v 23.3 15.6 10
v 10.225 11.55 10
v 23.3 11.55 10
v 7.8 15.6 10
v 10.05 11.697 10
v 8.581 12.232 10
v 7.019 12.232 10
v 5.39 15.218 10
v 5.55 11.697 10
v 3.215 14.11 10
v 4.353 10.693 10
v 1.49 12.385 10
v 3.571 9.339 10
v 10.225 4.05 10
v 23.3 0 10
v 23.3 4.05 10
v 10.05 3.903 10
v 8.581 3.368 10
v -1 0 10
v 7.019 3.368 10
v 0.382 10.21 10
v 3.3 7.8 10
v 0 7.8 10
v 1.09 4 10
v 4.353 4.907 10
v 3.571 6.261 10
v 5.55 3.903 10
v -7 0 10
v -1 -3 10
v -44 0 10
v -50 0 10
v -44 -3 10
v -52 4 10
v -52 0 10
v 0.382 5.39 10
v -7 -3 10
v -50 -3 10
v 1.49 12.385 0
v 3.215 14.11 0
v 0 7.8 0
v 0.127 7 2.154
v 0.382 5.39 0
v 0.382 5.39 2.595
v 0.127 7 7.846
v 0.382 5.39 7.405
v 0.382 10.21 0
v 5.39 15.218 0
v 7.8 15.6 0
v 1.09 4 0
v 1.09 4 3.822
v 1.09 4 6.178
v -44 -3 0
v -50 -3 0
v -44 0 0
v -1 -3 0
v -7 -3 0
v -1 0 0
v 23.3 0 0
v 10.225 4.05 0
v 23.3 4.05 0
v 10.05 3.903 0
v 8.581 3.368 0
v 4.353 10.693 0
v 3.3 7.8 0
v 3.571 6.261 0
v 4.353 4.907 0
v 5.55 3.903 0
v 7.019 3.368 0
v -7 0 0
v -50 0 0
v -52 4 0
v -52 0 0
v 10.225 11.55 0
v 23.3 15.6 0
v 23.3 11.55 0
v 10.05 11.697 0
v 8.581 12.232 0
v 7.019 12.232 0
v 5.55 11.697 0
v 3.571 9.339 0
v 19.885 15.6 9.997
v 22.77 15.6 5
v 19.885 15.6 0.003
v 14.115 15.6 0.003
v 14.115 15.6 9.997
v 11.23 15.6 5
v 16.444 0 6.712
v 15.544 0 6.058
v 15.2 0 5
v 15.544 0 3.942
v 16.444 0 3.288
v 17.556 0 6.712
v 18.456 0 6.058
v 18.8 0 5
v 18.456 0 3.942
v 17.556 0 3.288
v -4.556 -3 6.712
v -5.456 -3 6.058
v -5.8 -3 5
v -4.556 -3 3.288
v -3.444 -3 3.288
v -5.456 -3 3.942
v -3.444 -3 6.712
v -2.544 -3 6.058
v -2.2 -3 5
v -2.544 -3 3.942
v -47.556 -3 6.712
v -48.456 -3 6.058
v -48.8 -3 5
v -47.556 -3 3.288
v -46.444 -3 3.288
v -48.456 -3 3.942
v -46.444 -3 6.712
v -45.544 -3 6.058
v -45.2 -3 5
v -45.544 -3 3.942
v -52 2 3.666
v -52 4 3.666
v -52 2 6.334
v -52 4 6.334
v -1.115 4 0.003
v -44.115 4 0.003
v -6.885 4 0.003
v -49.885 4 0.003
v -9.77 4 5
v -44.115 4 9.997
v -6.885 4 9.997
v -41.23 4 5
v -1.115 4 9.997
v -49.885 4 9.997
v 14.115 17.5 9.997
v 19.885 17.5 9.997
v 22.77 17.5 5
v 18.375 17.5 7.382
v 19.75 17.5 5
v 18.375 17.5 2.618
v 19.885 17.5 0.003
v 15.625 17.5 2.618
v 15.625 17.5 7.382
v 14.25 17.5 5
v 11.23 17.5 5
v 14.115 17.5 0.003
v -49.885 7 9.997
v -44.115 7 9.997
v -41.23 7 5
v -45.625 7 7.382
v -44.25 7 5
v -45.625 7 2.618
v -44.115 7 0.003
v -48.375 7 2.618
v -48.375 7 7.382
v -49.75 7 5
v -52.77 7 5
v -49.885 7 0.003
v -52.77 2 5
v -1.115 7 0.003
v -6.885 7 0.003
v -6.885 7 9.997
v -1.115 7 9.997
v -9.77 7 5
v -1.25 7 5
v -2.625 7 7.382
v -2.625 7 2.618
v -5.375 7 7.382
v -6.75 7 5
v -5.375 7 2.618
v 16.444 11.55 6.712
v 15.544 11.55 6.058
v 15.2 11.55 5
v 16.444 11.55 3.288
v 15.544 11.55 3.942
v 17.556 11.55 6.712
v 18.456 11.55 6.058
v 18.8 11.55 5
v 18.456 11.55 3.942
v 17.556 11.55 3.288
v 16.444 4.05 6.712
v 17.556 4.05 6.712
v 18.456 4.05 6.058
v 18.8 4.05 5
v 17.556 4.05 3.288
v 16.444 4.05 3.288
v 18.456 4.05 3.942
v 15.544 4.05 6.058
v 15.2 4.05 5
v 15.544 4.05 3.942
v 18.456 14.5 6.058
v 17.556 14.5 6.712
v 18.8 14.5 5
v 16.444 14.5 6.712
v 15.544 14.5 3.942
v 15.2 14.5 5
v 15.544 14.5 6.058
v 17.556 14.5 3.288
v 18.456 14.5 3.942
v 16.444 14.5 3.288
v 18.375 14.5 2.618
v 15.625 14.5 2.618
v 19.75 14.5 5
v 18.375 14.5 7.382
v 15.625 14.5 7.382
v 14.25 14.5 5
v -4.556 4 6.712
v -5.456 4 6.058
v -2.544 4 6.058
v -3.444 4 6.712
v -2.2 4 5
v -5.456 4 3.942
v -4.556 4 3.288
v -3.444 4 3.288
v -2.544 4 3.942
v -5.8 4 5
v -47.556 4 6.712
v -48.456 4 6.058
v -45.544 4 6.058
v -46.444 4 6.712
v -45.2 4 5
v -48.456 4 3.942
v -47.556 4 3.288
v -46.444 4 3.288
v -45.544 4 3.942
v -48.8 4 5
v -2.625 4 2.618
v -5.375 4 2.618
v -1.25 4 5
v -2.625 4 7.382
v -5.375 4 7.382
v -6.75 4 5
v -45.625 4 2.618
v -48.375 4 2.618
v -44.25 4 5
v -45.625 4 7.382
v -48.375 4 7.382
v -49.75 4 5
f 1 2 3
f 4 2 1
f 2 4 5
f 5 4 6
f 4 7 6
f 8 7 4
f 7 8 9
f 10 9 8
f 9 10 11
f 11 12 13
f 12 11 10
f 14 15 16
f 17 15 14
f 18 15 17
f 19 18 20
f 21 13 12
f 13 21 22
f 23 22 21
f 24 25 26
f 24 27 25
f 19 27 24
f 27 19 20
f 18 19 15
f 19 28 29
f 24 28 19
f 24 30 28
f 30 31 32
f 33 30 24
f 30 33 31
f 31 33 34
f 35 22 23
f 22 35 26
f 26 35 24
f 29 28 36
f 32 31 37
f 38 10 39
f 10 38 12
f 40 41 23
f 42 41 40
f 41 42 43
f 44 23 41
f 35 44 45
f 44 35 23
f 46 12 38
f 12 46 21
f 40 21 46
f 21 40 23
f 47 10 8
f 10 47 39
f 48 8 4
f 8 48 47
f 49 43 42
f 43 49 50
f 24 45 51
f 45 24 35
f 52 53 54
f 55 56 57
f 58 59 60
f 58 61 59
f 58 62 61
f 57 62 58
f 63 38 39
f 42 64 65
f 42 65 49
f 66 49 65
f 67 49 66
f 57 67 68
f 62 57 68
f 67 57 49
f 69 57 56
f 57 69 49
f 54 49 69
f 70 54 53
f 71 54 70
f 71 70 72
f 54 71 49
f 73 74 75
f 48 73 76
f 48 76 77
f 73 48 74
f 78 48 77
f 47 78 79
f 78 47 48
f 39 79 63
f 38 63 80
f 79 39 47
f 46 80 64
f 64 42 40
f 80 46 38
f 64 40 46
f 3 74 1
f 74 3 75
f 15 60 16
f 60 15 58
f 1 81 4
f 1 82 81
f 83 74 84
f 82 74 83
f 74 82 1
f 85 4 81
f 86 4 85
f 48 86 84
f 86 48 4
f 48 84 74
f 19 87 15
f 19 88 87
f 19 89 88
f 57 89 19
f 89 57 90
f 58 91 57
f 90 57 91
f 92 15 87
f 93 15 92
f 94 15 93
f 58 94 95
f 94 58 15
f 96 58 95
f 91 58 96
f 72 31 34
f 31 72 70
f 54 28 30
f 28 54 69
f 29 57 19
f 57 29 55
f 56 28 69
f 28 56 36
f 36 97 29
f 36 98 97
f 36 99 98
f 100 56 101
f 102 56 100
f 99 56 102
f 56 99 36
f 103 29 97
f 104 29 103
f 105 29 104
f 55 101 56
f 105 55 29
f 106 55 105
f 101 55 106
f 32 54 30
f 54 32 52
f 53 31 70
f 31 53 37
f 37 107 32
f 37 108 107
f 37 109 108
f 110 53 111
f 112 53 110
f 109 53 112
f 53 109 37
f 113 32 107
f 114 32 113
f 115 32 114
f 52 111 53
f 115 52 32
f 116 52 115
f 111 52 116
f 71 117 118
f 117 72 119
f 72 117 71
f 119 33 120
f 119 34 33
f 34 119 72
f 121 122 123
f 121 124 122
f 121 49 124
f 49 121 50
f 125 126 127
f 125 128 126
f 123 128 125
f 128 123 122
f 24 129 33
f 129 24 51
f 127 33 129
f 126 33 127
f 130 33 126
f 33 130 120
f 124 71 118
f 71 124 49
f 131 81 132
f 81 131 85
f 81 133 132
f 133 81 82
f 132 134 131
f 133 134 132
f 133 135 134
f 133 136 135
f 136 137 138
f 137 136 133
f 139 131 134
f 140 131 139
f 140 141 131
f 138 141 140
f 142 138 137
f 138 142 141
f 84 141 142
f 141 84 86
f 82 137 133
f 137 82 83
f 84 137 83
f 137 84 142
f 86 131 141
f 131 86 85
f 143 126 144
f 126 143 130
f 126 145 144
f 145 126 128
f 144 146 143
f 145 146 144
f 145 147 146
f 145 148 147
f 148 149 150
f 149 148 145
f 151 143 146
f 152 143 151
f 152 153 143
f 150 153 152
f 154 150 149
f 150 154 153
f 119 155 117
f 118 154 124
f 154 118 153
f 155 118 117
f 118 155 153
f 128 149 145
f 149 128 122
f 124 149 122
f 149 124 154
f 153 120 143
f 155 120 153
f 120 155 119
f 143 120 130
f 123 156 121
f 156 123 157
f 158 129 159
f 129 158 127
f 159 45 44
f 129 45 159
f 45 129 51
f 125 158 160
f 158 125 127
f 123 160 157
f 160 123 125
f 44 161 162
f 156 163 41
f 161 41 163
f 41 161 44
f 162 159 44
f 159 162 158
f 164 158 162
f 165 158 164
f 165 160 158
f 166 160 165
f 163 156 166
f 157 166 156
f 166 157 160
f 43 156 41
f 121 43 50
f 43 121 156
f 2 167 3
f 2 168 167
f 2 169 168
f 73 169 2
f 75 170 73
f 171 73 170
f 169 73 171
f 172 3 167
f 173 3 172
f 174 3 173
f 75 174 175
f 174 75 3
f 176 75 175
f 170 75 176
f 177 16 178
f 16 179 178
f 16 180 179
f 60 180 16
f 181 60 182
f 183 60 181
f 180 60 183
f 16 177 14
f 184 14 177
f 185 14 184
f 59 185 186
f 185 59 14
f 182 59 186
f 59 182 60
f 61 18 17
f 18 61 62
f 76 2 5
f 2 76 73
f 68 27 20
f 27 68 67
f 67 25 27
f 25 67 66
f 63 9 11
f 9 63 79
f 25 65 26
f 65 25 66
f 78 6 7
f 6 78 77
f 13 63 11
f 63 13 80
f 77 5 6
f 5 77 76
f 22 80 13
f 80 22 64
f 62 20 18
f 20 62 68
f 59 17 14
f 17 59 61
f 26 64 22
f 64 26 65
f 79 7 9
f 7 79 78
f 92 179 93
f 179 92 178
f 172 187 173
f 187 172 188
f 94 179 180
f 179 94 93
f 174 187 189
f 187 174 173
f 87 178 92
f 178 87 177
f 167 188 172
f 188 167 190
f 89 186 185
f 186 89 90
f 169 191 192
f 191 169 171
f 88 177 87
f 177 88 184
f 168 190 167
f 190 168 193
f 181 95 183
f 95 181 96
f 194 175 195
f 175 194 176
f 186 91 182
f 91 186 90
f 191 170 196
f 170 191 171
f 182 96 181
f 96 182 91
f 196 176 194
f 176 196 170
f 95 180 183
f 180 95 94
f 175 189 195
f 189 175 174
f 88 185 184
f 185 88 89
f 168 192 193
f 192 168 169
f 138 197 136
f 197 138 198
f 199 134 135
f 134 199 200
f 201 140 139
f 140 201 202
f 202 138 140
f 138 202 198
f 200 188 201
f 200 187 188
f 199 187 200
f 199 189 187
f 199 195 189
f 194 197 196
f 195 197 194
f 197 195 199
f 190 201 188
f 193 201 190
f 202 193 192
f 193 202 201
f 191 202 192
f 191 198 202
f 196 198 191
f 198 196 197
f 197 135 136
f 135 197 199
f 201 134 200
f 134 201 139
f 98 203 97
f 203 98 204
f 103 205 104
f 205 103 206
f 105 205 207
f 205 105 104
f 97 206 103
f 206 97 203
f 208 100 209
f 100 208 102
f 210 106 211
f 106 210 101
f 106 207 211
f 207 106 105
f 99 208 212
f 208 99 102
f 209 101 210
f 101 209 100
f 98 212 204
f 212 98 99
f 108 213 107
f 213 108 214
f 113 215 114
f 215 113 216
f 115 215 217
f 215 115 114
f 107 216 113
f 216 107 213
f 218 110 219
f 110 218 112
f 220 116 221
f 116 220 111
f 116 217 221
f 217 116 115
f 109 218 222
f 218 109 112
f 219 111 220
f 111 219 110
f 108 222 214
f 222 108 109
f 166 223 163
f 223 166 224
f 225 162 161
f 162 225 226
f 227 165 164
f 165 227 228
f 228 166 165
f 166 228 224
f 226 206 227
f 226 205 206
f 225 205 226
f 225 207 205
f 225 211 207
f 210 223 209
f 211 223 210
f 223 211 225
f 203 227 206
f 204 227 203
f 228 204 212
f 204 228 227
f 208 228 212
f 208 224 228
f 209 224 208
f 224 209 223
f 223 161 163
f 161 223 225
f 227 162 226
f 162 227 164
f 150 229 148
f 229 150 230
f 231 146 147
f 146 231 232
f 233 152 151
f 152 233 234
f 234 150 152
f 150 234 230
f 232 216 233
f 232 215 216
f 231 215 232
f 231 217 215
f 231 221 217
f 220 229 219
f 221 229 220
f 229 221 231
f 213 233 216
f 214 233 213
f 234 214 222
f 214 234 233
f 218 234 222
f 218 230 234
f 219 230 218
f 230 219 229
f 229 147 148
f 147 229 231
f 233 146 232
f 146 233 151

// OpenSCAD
// file: functions.scad
// PRUSA Mendel  
// Functions used in many files
// GNU GPL v3
// Josef Průša
// josefprusa@me.com
// prusadjs.cz
// http://www.reprap.org/wiki/Prusa_Mendel
// http://github.com/prusajr/PrusaMendel


module nut(d,h,horizontal=true){
cornerdiameter =  (d / 2) / cos (180 / 6);
cylinder(h = h, r = cornerdiameter, $fn = 6);
if(horizontal){
for(i = [1:6]){
	rotate([0,0,60*i]) translate([-cornerdiameter-0.2,0,0]) rotate([0,0,-45]) cube(size = [2,2,h]);
}}
}

// Based on nophead research
module polyhole(d,h) {
    n = max(round(2 * d),3);
    rotate([0,0,180])
        cylinder(h = h, r = (d / 2) / cos (180 / n), $fn = n);
}




module roundcorner(diameter){
	difference(){
		cube(size = [diameter,diameter,99], center = false);
		translate(v = [diameter, diameter, 0]) cylinder(h = 100, r=diameter, center=true);
	}
}
// file: metric.scad
// PRUSA Mendel  
// Default metric sizes
// GNU GPL v3
// Josef Průša
// josefprusa@me.com
// prusadjs.cz
// http://www.reprap.org/wiki/Prusa_Mendel
// http://github.com/prusajr/PrusaMendel

// DONT CHANGE THIS FILE! ALTER VALUES IN CONFIGURATION.SCAD INSTEAD

// RODS

threaded_rod_diameter = 8.7;
threaded_rod_diameter_horizontal = 8.7;
smooth_bar_diameter = 8;
smooth_bar_diameter_horizontal = 8.5;

// Nuts and bolts

m8_diameter = 9;
m8_nut_diameter = 14.1;

m4_diameter = 4.5;
m4_nut_diameter = 9;

m3_diameter = 3.6;
m3_nut_diameter = 5.5;
m3_nut_diameter_horizontal = 6.1;

// Bushing holder

bushing_core_diameter = smooth_bar_diameter;
bushing_material_thickness = 1;

// Motors

motor_shaft = 5.5;
// file: configuration.scad
// PRUSA Mendel  
// Configuration file
// GNU GPL v3
// Josef Průša
// josefprusa@me.com
// prusadjs.cz
// http://www.reprap.org/wiki/Prusa_Mendel
// http://github.com/prusajr/PrusaMendel

// PLEASE SELECT ONE OF THE CONFIGURATIONS BELOW
// BY UN-COMMENTING IT

// Uncomment for metric settings
// METRIC METRIC METRIC METRIC METRIC METRIC METRIC METRIC 

include <metric.scad>;

// CUSTOM CUSTOM CUSTOM CUSTOM CUSTOM CUSTOM CUSTOM CUSTOM CUSTOM

thin_wall = 3;


// Linear bearing version
linear = false;
// set false for LM-8UU, true for LM-E-8UU (ignore if linear is set to false)
lme8uu = false;



// CHANGE ONLY THE STUFF YOU KNOW
// IT WILL REPLACE DEFAULT SETTING

// RODS

// threaded_rod_diameter = 0;
// threaded_rod_diameter_horizontal = 0;
// smooth_bar_diameter = 0;
// smooth_bar_diameter_horizontal = 0;

// Nuts and bolts

// m8_diameter = 0;
// m8_nut_diameter = 0;

// m4_diameter = 0;
// m4_nut_diameter = 0;

// m3_diameter = 0;
// m3_nut_diameter = 0;

// Bushing holder

// bushing_core_diameter = smooth_bar_diameter;
// bushing_material_thickness = 0;


///counted stuff
m3_nut_diameter_bigger = ((m3_nut_diameter  / 2) / cos (180 / 6))*2;

// functions 
include <functions.scad>
// main file
// PRUSA Mendel  
// Holder for Sanguinololu
// GNU GPL v3
// Josef Průša
// josefprusa@me.com
// prusadjs.cz
// http://www.reprap.org/wiki/Prusa_Mendel
// http://github.com/prusajr/PrusaMendel

include <configuration.scad>

/**
 * @id endstop-holder
 * @name Endstop holder
 * @category Printed
 * @using 1 m3x20xhex
 * @using 1 m3nut
 * @using 2 m3washer
 */
module endstop(){
outer_diameter = m8_diameter/2+3.3;
screw_hole_spacing = 43;
opening_size = m8_diameter-1.5; //openingsize

difference(){
	union(){


		translate([outer_diameter, outer_diameter, 0]) cylinder(h =10, r = outer_diameter, $fn = 20);
		translate([outer_diameter, 0, 0]) cube([15.5,outer_diameter*2,10]);
		
		//standoffs
		translate([-4-3, -3, 0]) cube([6,5,10]);
		translate([-4-3-screw_hole_spacing, -3, 0]) cube([6,5,10]);
		
		translate([-9-screw_hole_spacing, 0, 0]) cube([32+screw_hole_spacing, 4, 10]);
		translate([17, 17.5, 5]) rotate([90, 0, 0]) #cylinder(h =5, r = 5.77, $fn = 6);
		
		
		translate([-(4+screw_hole_spacing), 0,0]) translate([0, 7, 5]) rotate([90, 0, 0]) #cylinder(h =5, r = 5.77, $fn = 6);
		translate([-4, 0,0]) translate([0, 7, 5]) rotate([90, 0, 0]) #cylinder(h =5, r = 5.77, $fn = 6);
	}




	translate([9, outer_diameter-opening_size/2, 0]) cube([18,opening_size,20]);
	translate([outer_diameter, outer_diameter, 0]) cylinder(h =20, r = m8_diameter/2, $fn = 18);

	//Securing hole
	translate([17, 17, 5]) rotate([90, 0, 0]) cylinder(h =20, r = m3_diameter/2, $fn = 10);
	translate([17, 19.5, 5]) rotate([90, 0, 0]) #cylinder(h =5, r = m3_nut_diameter/2, $fn = 6);

	translate([17, 17, 5]) rotate([90, 0, 0]) #cylinder(h =20, r = m3_diameter/2, $fn = 10);
	translate([-4, 17, 5]) rotate([90, 0, 0]) cylinder(h =20, r = m3_diameter/2, $fn = 10);
	translate([-(4+screw_hole_spacing), 17, 5]) rotate([90, 0, 0]) #cylinder(h =20, r = m3_diameter/2, $fn = 10);
	
	
	
	translate([-4, 9, 5]) rotate([90, 0, 0]) #cylinder(h =5, r = m3_nut_diameter/2, $fn = 6);
	translate([-(4+screw_hole_spacing), 9, 5]) rotate([90, 0, 0]) #cylinder(h =5, r = m3_nut_diameter/2, $fn = 6);
}
}
endstop();
